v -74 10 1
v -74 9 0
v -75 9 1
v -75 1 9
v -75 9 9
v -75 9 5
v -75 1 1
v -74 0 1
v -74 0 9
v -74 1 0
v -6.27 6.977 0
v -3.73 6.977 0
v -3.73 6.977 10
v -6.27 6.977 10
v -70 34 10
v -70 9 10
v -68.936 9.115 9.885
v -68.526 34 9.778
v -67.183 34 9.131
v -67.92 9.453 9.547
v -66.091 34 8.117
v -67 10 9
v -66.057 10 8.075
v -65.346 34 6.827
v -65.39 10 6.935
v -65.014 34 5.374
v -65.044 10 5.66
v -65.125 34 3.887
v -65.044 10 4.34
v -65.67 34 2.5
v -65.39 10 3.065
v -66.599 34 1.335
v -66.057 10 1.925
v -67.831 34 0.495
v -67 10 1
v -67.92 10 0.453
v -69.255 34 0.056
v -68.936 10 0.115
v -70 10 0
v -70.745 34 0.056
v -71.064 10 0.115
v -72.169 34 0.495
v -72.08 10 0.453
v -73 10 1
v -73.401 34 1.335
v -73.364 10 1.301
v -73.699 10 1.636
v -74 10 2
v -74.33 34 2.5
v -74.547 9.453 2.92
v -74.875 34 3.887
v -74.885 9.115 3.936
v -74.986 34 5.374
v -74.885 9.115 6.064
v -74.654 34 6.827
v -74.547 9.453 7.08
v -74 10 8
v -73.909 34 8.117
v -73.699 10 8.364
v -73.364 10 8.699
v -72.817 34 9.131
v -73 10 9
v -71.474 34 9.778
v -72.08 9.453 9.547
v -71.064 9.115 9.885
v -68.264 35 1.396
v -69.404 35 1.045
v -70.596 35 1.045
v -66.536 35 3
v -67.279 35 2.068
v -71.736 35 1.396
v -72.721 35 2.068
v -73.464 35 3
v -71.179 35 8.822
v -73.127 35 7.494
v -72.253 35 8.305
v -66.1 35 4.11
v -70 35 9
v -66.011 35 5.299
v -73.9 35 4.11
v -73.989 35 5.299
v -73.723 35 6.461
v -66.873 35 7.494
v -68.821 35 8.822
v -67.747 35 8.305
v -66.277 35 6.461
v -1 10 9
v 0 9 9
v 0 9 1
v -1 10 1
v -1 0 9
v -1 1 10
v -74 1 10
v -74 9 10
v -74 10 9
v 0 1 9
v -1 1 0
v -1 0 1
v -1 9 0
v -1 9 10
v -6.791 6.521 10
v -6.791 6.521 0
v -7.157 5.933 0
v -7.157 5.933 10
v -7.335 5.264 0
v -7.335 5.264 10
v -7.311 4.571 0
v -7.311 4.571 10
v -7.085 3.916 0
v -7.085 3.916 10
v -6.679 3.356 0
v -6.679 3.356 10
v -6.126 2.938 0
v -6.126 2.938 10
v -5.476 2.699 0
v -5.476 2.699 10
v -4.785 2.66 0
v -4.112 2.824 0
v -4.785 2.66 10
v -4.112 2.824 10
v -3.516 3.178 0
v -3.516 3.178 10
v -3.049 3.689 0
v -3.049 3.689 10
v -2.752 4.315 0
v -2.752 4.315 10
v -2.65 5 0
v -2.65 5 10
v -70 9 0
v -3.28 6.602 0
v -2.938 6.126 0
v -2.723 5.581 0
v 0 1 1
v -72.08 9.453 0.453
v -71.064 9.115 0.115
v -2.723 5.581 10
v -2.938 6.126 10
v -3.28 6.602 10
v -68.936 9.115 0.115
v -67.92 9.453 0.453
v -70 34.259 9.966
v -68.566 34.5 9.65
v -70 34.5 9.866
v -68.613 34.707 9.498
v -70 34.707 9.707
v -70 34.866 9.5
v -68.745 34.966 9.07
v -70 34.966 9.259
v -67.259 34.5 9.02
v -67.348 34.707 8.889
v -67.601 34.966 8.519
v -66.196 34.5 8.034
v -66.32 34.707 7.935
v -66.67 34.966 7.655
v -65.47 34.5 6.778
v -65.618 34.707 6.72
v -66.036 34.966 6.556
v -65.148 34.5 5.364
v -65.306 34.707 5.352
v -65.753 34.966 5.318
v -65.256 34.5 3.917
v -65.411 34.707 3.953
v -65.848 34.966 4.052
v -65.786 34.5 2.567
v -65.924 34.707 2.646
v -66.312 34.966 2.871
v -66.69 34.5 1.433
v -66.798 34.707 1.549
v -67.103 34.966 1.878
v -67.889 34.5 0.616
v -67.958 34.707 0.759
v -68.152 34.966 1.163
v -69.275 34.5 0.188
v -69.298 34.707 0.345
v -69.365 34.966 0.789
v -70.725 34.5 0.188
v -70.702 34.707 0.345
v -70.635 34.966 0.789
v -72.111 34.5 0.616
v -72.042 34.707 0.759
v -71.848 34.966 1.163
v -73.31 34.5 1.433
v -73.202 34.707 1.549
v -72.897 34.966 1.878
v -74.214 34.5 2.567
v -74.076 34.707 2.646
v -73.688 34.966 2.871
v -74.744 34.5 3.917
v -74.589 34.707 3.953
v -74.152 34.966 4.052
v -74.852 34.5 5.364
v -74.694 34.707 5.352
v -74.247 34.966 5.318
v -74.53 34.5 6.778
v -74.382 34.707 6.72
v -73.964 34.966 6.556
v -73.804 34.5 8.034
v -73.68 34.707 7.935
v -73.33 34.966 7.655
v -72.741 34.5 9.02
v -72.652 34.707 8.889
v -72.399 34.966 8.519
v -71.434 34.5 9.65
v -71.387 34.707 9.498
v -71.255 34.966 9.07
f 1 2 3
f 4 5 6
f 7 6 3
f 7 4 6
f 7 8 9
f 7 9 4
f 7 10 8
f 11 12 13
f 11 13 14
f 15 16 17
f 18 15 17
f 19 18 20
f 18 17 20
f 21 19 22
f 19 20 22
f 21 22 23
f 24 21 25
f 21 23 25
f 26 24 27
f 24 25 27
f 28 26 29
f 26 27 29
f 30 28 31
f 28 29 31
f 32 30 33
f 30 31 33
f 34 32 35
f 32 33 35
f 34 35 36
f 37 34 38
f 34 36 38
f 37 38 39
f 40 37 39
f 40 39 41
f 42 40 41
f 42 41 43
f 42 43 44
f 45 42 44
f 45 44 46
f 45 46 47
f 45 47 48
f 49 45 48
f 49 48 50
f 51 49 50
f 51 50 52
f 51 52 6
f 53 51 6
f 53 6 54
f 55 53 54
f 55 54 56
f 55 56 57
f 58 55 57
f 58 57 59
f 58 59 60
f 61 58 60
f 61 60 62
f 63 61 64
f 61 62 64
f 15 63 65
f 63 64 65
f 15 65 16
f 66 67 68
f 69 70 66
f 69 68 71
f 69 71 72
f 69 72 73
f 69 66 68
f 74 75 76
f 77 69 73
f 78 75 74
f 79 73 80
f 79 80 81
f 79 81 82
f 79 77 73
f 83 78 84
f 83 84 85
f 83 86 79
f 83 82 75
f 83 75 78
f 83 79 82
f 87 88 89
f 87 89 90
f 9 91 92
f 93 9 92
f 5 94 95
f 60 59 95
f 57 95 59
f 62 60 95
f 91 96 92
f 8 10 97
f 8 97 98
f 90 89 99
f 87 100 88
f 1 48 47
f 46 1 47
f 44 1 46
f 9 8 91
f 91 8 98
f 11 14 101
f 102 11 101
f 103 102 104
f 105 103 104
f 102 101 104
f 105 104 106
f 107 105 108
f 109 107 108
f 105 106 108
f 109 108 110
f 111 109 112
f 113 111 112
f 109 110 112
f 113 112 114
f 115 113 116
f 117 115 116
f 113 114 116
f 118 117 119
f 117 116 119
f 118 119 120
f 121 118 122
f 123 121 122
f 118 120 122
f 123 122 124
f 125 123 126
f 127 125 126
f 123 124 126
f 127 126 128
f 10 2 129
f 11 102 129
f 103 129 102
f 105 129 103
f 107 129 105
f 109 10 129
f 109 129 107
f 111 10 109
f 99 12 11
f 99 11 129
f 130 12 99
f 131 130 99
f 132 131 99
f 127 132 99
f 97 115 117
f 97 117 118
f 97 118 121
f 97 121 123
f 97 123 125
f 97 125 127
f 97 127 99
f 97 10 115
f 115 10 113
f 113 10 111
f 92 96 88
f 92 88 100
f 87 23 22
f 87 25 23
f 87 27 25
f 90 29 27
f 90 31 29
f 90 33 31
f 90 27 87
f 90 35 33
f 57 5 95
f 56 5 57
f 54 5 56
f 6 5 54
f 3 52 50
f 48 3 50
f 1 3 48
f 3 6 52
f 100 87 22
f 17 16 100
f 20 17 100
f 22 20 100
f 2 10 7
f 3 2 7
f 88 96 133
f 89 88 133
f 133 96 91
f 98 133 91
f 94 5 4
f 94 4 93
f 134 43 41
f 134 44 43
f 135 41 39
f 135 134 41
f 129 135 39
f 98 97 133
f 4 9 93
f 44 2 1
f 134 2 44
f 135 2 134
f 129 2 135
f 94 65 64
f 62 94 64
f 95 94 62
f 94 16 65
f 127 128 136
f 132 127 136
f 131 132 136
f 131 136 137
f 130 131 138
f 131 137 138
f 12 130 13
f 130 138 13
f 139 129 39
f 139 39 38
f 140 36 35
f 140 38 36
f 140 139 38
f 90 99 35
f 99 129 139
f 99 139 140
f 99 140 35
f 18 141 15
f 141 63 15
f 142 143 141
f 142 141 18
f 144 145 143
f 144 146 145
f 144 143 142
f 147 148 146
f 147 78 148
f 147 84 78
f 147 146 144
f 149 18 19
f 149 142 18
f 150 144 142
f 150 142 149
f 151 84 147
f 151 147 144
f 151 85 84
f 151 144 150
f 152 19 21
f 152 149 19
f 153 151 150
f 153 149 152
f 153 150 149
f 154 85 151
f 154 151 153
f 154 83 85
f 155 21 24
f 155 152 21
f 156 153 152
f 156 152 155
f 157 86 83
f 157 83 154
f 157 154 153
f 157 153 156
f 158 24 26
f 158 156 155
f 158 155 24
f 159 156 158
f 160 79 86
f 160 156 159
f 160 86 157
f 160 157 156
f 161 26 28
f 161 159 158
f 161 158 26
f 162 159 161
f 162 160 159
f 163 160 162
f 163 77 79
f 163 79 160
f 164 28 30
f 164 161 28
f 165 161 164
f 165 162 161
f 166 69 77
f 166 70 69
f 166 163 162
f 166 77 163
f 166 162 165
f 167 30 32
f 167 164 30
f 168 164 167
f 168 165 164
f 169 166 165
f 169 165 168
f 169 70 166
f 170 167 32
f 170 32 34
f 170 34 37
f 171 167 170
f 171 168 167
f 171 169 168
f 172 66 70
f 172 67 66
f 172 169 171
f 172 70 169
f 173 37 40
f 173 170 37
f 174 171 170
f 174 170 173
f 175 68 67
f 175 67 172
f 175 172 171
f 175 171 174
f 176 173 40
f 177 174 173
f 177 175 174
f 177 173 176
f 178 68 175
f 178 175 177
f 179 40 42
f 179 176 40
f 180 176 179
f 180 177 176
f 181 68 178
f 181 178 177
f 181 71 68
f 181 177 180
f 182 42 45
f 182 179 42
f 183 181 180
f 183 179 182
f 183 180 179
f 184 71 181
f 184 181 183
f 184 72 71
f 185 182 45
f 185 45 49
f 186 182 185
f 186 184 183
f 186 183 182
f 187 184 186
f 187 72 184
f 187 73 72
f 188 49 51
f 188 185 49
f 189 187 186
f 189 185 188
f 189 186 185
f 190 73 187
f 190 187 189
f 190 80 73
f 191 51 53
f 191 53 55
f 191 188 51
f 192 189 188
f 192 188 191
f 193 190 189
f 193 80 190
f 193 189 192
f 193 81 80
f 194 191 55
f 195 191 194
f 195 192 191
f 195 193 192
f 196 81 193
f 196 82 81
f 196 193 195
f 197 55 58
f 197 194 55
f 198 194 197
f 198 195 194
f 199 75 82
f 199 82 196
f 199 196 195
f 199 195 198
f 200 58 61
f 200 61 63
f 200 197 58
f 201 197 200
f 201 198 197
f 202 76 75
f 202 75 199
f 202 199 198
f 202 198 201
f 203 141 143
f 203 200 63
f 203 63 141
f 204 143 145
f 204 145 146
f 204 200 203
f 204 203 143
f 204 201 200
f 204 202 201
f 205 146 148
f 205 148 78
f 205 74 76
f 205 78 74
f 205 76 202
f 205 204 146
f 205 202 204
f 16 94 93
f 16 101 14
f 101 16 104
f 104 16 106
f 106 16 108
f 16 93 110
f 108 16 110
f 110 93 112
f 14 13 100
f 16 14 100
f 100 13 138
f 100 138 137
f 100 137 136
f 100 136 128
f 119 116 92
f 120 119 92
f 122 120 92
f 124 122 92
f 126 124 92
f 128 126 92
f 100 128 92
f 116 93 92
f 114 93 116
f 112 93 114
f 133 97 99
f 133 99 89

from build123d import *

# Parameters (mm, degrees)
SKETCH8_W           = 75
SKETCH8_H           = 10
BOSS_EXTRUDE5_DEPTH = 10
SKETCH9_R           = 5
BOSS_EXTRUDE7_DEPTH = 25
CUT_EXTRUDE1_DEPTH  = 84.366660003
CHAMFER1_SIZE       = 1
FILLET1_R           = 1


with BuildPart() as part:
    # Sketch8 → Boss-Extrude5 (new body)
    with BuildSketch(Plane(origin=(0, 0, 0), x_dir=(1, 0, 0), z_dir=(0, 1, 0))):
        with Locations((-37.5, -5)):
            Rectangle(SKETCH8_W, SKETCH8_H)
    extrude(amount=BOSS_EXTRUDE5_DEPTH)

    # Sketch9 → Boss-Extrude7 (add)
    with BuildSketch(Plane(origin=(0, 10, 0), x_dir=(1, 0, 0), z_dir=(0, 1, 0))):
        with Locations(Location((-70, -5, 0), (0, 0, 270))):
            Circle(SKETCH9_R)
    extrude(amount=BOSS_EXTRUDE7_DEPTH)

    # Sketch13 → Cut-Extrude1 (cut, through all)
    with BuildSketch(Plane.XY.offset(10)):
        with BuildLine():
            Line((-3.73, 6.977270846), (-6.27, 6.977270846))
            ThreePointArc((-6.27, 6.977270846), (-6.126499001, 2.937598487), (-2.65, 5))
            ThreePointArc((-2.65, 5), (-2.937598487, 6.126499001), (-3.73, 6.977270846))
        make_face()
    extrude(amount=-CUT_EXTRUDE1_DEPTH, mode=Mode.SUBTRACT)

    # Chamfer1
    # the kernel refuses this chamfer: 1 mm, written as the material it takes off along each edge
    with BuildSketch(Plane(origin=(-74.333333333, 9.333333333, 0.666666667), x_dir=(-0.7071067811865476, 0, 0.7071067811865475), z_dir=(-0.5773502691896257, 0.5773502691896256, -0.5773502691896258)), Plane(origin=(-74.333333333, 9.333333333, 9.333333333), x_dir=(0, 0.7071067811865475, -0.7071067811865475), z_dir=(-0.5773502691896258, 0.5773502691896258, 0.5773502691896258)), Plane(origin=(-0.666666667, 9.333333333, 9.333333333), x_dir=(0.7071067811865479, 0, -0.7071067811865471), z_dir=(0.5773502691896254, 0.577350269189626, 0.577350269189626)), Plane(origin=(-74.333333333, 0.666666667, 0.666666667), x_dir=(0, -0.7071067811865476, 0.7071067811865476), z_dir=(-0.5773502691896256, -0.5773502691896258, -0.5773502691896258)), Plane(origin=(-0.666666667, 0.666666667, 0.666666667), x_dir=(0.7071067811865476, 0, 0.7071067811865475), z_dir=(0.5773502691896257, -0.5773502691896257, -0.5773502691896258))) as chamfer1_piece_1:
        Polygon((-0.707106781, -0.40824829), (0.707106781, -0.40824829), (0, 0.816496581), align=None)
    extrude(amount=1.270170592, mode=Mode.SUBTRACT)
    with BuildSketch(Plane(origin=(-0.666666667, 9.333333333, 0.666666667), x_dir=(0.7071067811865476, 0, 0.7071067811865475), z_dir=(0.5773502691896257, 0.5773502691896257, -0.5773502691896258)), Plane(origin=(-74.333333333, 0.666666667, 9.333333333), x_dir=(0, -0.7071067811865475, -0.7071067811865476), z_dir=(-0.5773502691896256, -0.5773502691896258, 0.5773502691896257)), Plane(origin=(-0.666666667, 0.666666667, 9.333333333), x_dir=(0.7071067811865479, 0, -0.7071067811865471), z_dir=(0.5773502691896253, -0.577350269189626, 0.5773502691896258))) as chamfer1_piece_2:
        Polygon((-0.707106781, 0.40824829), (0.707106781, 0.40824829), (0, -0.816496581), align=None)
    extrude(amount=1.270170592, mode=Mode.SUBTRACT)
    with BuildSketch(Plane(origin=(-75, 10, -2.571682988), x_dir=(-0.0274958766105822, -0.999621916911297, 0), z_dir=(0, 0, 1))) as chamfer1_piece_3_section:
        Polygon((CHAMFER1_SIZE * 0.999621916911, CHAMFER1_SIZE * 0.0274958766106), (-CHAMFER1_SIZE * 0.0274958766106, CHAMFER1_SIZE * 0.999621916911), (0, 0), align=None)
    chamfer1_piece_3 = extrude(amount=7.571682988, mode=Mode.PRIVATE)
    chamfer1_piece_3 = chamfer1_piece_3 - Plane(origin=(-70, 9.64391603, 5), x_dir=(0, 0, 1), z_dir=(0, -1, 0)) * Cylinder(5, 20, mode=Mode.PRIVATE)
    add(chamfer1_piece_3, mode=Mode.SUBTRACT)
    with BuildSketch(Plane(origin=(-77.571682988, 10, 10), x_dir=(0, -0.9996219169112968, 0.027495876610585647), z_dir=(1, 0, 0))) as chamfer1_piece_4_section:
        Polygon((CHAMFER1_SIZE * 0.999621916911, CHAMFER1_SIZE * 0.0274958766106), (-CHAMFER1_SIZE * 0.0274958766106, CHAMFER1_SIZE * 0.999621916911), (0, 0), align=None)
    chamfer1_piece_4 = extrude(amount=7.571682988, mode=Mode.PRIVATE)
    chamfer1_piece_4 = chamfer1_piece_4 - Plane(origin=(-70, 9.64391603, 5), x_dir=(0, 0, 1), z_dir=(0, -1, 0)) * Cylinder(5, 20, mode=Mode.PRIVATE)
    add(chamfer1_piece_4, mode=Mode.SUBTRACT)
    with BuildSketch(Plane(origin=(-69.999999992, 10, 0), x_dir=(0, -0.9996219169112968, -0.0274958766105864), z_dir=(-1, 0, 0))) as chamfer1_piece_5_section:
        Polygon((CHAMFER1_SIZE * 0.999621916911, CHAMFER1_SIZE * 0.0274958766106), (-CHAMFER1_SIZE * 0.0274958766106, CHAMFER1_SIZE * 0.999621916911), (0, 0), align=None)
    chamfer1_piece_5 = extrude(amount=7.571682996, mode=Mode.PRIVATE)
    chamfer1_piece_5 = chamfer1_piece_5 - Plane(origin=(-70, 9.643916029, 5), x_dir=(0, 0, 1), z_dir=(0, -1, 0)) * Cylinder(5, 20, mode=Mode.PRIVATE)
    add(chamfer1_piece_5, mode=Mode.SUBTRACT)
    with BuildSketch(Plane(origin=(-75, 10, 5), x_dir=(-0.0274958766105822, -0.999621916911297, 0), z_dir=(0, 0, 1))) as chamfer1_piece_6_section:
        Polygon((CHAMFER1_SIZE * 0.999621916911, CHAMFER1_SIZE * 0.0274958766106), (-CHAMFER1_SIZE * 0.0274958766106, CHAMFER1_SIZE * 0.999621916911), (0, 0), align=None)
    chamfer1_piece_6 = extrude(amount=7.571682988, mode=Mode.PRIVATE)
    chamfer1_piece_6 = chamfer1_piece_6 - Plane(origin=(-70, 9.643916029, 5), x_dir=(0, 0, 1), z_dir=(0, -1, 0)) * Cylinder(5, 20, mode=Mode.PRIVATE)
    add(chamfer1_piece_6, mode=Mode.SUBTRACT)
    with BuildSketch(Plane(origin=(-70, 10, 10), x_dir=(0, 0.027495876610585647, -0.9996219169112968), z_dir=(1, 0, 0))) as chamfer1_piece_7_section:
        Polygon((CHAMFER1_SIZE * 0.999621916911, -CHAMFER1_SIZE * 0.0274958766106), (-CHAMFER1_SIZE * 0.0274958766106, -CHAMFER1_SIZE * 0.999621916911), (0, 0), align=None)
    chamfer1_piece_7 = extrude(amount=72.571682988, mode=Mode.PRIVATE)
    chamfer1_piece_7 = chamfer1_piece_7 - Plane(origin=(-70, 9.665551568, 5), x_dir=(0, 0, 1), z_dir=(0, -1, 0)) * Cylinder(5, 150, mode=Mode.PRIVATE)
    add(chamfer1_piece_7, mode=Mode.SUBTRACT)
    with BuildSketch(Plane(origin=(0, 10, 12.571682988), x_dir=(0.027495876610586414, -0.9996219169112968, 0), z_dir=(0, 0, -1)), Plane(origin=(-75, 0, -2.571682988), x_dir=(0.9996219169112968, -0.027495876610586483, 0), z_dir=(0, 0, 1)), Plane(origin=(0, -2.571682988, 10), x_dir=(0.02749587661058629, 0, -0.9996219169112968), z_dir=(0, 1, 0)), Plane(origin=(0, -2.571682988, 0), x_dir=(-0.9996219169112968, 0, -0.02749587661058625), z_dir=(0, 1, 0))) as chamfer1_piece_8:
        Polygon((CHAMFER1_SIZE * 0.999621916911, CHAMFER1_SIZE * 0.0274958766106), (-CHAMFER1_SIZE * 0.0274958766106, CHAMFER1_SIZE * 0.999621916911), (0, 0), align=None)
    extrude(amount=15.143365976, mode=Mode.SUBTRACT)
    with BuildSketch(Plane(origin=(-77.571682988, 0, 10), x_dir=(0, -0.02749587661058639, -0.9996219169112968), z_dir=(1, 0, 0))) as chamfer1_piece_9:
        Polygon((CHAMFER1_SIZE * 0.999621916911, CHAMFER1_SIZE * 0.0274958766106), (-CHAMFER1_SIZE * 0.0274958766106, CHAMFER1_SIZE * 0.999621916911), (0, 0), align=None)
    extrude(amount=80.143365976, mode=Mode.SUBTRACT)
    with BuildSketch(Plane(origin=(2.571682988, 0, 0), x_dir=(0, 0.9996219169112968, -0.027495876610586382), z_dir=(-1, 0, 0))) as chamfer1_piece_10:
        Polygon((CHAMFER1_SIZE * 0.999621916911, -CHAMFER1_SIZE * 0.0274958766106), (-CHAMFER1_SIZE * 0.0274958766106, -CHAMFER1_SIZE * 0.999621916911), (0, 0), align=None)
    extrude(amount=80.143365976, mode=Mode.SUBTRACT)
    with BuildSketch(Plane(origin=(0, 0, 12.571682988), x_dir=(0.027495876610586393, 0.9996219169112968, 0), z_dir=(0, 0, -1)), Plane(origin=(-75, -2.571682988, 10), x_dir=(-0.0274958766105822, 0, -0.999621916911297), z_dir=(0, 1, 0)), Plane(origin=(-75, -2.571682988, 0), x_dir=(0.9996219169112968, 0, -0.0274958766105866), z_dir=(0, 1, 0))) as chamfer1_piece_11:
        Polygon((CHAMFER1_SIZE * 0.999621916911, -CHAMFER1_SIZE * 0.0274958766106), (-CHAMFER1_SIZE * 0.0274958766106, -CHAMFER1_SIZE * 0.999621916911), (0, 0), align=None)
    extrude(amount=15.143365976, mode=Mode.SUBTRACT)
    with BuildSketch(Plane(origin=(2.571682988, 10, 0), x_dir=(0, -0.9996219169112968, -0.0274958766105864), z_dir=(-1, 0, 0))) as chamfer1_piece_12_section:
        Polygon((CHAMFER1_SIZE * 0.999621916911, CHAMFER1_SIZE * 0.0274958766106), (-CHAMFER1_SIZE * 0.0274958766106, CHAMFER1_SIZE * 0.999621916911), (0, 0), align=None)
    chamfer1_piece_12 = extrude(amount=72.571682979, mode=Mode.PRIVATE)
    chamfer1_piece_12 = chamfer1_piece_12 - Plane(origin=(-70, 9.665551567, 5), x_dir=(0, 0, 1), z_dir=(0, -1, 0)) * Cylinder(5, 150, mode=Mode.PRIVATE)
    add(chamfer1_piece_12, mode=Mode.SUBTRACT)

    # Fillet1
    fillet1_edges = [part.edges().sort_by_distance(p)[0] for p in [
        (-70, 35, 0),
    ]]
    fillet(fillet1_edges, radius=FILLET1_R)


solid = part.part
